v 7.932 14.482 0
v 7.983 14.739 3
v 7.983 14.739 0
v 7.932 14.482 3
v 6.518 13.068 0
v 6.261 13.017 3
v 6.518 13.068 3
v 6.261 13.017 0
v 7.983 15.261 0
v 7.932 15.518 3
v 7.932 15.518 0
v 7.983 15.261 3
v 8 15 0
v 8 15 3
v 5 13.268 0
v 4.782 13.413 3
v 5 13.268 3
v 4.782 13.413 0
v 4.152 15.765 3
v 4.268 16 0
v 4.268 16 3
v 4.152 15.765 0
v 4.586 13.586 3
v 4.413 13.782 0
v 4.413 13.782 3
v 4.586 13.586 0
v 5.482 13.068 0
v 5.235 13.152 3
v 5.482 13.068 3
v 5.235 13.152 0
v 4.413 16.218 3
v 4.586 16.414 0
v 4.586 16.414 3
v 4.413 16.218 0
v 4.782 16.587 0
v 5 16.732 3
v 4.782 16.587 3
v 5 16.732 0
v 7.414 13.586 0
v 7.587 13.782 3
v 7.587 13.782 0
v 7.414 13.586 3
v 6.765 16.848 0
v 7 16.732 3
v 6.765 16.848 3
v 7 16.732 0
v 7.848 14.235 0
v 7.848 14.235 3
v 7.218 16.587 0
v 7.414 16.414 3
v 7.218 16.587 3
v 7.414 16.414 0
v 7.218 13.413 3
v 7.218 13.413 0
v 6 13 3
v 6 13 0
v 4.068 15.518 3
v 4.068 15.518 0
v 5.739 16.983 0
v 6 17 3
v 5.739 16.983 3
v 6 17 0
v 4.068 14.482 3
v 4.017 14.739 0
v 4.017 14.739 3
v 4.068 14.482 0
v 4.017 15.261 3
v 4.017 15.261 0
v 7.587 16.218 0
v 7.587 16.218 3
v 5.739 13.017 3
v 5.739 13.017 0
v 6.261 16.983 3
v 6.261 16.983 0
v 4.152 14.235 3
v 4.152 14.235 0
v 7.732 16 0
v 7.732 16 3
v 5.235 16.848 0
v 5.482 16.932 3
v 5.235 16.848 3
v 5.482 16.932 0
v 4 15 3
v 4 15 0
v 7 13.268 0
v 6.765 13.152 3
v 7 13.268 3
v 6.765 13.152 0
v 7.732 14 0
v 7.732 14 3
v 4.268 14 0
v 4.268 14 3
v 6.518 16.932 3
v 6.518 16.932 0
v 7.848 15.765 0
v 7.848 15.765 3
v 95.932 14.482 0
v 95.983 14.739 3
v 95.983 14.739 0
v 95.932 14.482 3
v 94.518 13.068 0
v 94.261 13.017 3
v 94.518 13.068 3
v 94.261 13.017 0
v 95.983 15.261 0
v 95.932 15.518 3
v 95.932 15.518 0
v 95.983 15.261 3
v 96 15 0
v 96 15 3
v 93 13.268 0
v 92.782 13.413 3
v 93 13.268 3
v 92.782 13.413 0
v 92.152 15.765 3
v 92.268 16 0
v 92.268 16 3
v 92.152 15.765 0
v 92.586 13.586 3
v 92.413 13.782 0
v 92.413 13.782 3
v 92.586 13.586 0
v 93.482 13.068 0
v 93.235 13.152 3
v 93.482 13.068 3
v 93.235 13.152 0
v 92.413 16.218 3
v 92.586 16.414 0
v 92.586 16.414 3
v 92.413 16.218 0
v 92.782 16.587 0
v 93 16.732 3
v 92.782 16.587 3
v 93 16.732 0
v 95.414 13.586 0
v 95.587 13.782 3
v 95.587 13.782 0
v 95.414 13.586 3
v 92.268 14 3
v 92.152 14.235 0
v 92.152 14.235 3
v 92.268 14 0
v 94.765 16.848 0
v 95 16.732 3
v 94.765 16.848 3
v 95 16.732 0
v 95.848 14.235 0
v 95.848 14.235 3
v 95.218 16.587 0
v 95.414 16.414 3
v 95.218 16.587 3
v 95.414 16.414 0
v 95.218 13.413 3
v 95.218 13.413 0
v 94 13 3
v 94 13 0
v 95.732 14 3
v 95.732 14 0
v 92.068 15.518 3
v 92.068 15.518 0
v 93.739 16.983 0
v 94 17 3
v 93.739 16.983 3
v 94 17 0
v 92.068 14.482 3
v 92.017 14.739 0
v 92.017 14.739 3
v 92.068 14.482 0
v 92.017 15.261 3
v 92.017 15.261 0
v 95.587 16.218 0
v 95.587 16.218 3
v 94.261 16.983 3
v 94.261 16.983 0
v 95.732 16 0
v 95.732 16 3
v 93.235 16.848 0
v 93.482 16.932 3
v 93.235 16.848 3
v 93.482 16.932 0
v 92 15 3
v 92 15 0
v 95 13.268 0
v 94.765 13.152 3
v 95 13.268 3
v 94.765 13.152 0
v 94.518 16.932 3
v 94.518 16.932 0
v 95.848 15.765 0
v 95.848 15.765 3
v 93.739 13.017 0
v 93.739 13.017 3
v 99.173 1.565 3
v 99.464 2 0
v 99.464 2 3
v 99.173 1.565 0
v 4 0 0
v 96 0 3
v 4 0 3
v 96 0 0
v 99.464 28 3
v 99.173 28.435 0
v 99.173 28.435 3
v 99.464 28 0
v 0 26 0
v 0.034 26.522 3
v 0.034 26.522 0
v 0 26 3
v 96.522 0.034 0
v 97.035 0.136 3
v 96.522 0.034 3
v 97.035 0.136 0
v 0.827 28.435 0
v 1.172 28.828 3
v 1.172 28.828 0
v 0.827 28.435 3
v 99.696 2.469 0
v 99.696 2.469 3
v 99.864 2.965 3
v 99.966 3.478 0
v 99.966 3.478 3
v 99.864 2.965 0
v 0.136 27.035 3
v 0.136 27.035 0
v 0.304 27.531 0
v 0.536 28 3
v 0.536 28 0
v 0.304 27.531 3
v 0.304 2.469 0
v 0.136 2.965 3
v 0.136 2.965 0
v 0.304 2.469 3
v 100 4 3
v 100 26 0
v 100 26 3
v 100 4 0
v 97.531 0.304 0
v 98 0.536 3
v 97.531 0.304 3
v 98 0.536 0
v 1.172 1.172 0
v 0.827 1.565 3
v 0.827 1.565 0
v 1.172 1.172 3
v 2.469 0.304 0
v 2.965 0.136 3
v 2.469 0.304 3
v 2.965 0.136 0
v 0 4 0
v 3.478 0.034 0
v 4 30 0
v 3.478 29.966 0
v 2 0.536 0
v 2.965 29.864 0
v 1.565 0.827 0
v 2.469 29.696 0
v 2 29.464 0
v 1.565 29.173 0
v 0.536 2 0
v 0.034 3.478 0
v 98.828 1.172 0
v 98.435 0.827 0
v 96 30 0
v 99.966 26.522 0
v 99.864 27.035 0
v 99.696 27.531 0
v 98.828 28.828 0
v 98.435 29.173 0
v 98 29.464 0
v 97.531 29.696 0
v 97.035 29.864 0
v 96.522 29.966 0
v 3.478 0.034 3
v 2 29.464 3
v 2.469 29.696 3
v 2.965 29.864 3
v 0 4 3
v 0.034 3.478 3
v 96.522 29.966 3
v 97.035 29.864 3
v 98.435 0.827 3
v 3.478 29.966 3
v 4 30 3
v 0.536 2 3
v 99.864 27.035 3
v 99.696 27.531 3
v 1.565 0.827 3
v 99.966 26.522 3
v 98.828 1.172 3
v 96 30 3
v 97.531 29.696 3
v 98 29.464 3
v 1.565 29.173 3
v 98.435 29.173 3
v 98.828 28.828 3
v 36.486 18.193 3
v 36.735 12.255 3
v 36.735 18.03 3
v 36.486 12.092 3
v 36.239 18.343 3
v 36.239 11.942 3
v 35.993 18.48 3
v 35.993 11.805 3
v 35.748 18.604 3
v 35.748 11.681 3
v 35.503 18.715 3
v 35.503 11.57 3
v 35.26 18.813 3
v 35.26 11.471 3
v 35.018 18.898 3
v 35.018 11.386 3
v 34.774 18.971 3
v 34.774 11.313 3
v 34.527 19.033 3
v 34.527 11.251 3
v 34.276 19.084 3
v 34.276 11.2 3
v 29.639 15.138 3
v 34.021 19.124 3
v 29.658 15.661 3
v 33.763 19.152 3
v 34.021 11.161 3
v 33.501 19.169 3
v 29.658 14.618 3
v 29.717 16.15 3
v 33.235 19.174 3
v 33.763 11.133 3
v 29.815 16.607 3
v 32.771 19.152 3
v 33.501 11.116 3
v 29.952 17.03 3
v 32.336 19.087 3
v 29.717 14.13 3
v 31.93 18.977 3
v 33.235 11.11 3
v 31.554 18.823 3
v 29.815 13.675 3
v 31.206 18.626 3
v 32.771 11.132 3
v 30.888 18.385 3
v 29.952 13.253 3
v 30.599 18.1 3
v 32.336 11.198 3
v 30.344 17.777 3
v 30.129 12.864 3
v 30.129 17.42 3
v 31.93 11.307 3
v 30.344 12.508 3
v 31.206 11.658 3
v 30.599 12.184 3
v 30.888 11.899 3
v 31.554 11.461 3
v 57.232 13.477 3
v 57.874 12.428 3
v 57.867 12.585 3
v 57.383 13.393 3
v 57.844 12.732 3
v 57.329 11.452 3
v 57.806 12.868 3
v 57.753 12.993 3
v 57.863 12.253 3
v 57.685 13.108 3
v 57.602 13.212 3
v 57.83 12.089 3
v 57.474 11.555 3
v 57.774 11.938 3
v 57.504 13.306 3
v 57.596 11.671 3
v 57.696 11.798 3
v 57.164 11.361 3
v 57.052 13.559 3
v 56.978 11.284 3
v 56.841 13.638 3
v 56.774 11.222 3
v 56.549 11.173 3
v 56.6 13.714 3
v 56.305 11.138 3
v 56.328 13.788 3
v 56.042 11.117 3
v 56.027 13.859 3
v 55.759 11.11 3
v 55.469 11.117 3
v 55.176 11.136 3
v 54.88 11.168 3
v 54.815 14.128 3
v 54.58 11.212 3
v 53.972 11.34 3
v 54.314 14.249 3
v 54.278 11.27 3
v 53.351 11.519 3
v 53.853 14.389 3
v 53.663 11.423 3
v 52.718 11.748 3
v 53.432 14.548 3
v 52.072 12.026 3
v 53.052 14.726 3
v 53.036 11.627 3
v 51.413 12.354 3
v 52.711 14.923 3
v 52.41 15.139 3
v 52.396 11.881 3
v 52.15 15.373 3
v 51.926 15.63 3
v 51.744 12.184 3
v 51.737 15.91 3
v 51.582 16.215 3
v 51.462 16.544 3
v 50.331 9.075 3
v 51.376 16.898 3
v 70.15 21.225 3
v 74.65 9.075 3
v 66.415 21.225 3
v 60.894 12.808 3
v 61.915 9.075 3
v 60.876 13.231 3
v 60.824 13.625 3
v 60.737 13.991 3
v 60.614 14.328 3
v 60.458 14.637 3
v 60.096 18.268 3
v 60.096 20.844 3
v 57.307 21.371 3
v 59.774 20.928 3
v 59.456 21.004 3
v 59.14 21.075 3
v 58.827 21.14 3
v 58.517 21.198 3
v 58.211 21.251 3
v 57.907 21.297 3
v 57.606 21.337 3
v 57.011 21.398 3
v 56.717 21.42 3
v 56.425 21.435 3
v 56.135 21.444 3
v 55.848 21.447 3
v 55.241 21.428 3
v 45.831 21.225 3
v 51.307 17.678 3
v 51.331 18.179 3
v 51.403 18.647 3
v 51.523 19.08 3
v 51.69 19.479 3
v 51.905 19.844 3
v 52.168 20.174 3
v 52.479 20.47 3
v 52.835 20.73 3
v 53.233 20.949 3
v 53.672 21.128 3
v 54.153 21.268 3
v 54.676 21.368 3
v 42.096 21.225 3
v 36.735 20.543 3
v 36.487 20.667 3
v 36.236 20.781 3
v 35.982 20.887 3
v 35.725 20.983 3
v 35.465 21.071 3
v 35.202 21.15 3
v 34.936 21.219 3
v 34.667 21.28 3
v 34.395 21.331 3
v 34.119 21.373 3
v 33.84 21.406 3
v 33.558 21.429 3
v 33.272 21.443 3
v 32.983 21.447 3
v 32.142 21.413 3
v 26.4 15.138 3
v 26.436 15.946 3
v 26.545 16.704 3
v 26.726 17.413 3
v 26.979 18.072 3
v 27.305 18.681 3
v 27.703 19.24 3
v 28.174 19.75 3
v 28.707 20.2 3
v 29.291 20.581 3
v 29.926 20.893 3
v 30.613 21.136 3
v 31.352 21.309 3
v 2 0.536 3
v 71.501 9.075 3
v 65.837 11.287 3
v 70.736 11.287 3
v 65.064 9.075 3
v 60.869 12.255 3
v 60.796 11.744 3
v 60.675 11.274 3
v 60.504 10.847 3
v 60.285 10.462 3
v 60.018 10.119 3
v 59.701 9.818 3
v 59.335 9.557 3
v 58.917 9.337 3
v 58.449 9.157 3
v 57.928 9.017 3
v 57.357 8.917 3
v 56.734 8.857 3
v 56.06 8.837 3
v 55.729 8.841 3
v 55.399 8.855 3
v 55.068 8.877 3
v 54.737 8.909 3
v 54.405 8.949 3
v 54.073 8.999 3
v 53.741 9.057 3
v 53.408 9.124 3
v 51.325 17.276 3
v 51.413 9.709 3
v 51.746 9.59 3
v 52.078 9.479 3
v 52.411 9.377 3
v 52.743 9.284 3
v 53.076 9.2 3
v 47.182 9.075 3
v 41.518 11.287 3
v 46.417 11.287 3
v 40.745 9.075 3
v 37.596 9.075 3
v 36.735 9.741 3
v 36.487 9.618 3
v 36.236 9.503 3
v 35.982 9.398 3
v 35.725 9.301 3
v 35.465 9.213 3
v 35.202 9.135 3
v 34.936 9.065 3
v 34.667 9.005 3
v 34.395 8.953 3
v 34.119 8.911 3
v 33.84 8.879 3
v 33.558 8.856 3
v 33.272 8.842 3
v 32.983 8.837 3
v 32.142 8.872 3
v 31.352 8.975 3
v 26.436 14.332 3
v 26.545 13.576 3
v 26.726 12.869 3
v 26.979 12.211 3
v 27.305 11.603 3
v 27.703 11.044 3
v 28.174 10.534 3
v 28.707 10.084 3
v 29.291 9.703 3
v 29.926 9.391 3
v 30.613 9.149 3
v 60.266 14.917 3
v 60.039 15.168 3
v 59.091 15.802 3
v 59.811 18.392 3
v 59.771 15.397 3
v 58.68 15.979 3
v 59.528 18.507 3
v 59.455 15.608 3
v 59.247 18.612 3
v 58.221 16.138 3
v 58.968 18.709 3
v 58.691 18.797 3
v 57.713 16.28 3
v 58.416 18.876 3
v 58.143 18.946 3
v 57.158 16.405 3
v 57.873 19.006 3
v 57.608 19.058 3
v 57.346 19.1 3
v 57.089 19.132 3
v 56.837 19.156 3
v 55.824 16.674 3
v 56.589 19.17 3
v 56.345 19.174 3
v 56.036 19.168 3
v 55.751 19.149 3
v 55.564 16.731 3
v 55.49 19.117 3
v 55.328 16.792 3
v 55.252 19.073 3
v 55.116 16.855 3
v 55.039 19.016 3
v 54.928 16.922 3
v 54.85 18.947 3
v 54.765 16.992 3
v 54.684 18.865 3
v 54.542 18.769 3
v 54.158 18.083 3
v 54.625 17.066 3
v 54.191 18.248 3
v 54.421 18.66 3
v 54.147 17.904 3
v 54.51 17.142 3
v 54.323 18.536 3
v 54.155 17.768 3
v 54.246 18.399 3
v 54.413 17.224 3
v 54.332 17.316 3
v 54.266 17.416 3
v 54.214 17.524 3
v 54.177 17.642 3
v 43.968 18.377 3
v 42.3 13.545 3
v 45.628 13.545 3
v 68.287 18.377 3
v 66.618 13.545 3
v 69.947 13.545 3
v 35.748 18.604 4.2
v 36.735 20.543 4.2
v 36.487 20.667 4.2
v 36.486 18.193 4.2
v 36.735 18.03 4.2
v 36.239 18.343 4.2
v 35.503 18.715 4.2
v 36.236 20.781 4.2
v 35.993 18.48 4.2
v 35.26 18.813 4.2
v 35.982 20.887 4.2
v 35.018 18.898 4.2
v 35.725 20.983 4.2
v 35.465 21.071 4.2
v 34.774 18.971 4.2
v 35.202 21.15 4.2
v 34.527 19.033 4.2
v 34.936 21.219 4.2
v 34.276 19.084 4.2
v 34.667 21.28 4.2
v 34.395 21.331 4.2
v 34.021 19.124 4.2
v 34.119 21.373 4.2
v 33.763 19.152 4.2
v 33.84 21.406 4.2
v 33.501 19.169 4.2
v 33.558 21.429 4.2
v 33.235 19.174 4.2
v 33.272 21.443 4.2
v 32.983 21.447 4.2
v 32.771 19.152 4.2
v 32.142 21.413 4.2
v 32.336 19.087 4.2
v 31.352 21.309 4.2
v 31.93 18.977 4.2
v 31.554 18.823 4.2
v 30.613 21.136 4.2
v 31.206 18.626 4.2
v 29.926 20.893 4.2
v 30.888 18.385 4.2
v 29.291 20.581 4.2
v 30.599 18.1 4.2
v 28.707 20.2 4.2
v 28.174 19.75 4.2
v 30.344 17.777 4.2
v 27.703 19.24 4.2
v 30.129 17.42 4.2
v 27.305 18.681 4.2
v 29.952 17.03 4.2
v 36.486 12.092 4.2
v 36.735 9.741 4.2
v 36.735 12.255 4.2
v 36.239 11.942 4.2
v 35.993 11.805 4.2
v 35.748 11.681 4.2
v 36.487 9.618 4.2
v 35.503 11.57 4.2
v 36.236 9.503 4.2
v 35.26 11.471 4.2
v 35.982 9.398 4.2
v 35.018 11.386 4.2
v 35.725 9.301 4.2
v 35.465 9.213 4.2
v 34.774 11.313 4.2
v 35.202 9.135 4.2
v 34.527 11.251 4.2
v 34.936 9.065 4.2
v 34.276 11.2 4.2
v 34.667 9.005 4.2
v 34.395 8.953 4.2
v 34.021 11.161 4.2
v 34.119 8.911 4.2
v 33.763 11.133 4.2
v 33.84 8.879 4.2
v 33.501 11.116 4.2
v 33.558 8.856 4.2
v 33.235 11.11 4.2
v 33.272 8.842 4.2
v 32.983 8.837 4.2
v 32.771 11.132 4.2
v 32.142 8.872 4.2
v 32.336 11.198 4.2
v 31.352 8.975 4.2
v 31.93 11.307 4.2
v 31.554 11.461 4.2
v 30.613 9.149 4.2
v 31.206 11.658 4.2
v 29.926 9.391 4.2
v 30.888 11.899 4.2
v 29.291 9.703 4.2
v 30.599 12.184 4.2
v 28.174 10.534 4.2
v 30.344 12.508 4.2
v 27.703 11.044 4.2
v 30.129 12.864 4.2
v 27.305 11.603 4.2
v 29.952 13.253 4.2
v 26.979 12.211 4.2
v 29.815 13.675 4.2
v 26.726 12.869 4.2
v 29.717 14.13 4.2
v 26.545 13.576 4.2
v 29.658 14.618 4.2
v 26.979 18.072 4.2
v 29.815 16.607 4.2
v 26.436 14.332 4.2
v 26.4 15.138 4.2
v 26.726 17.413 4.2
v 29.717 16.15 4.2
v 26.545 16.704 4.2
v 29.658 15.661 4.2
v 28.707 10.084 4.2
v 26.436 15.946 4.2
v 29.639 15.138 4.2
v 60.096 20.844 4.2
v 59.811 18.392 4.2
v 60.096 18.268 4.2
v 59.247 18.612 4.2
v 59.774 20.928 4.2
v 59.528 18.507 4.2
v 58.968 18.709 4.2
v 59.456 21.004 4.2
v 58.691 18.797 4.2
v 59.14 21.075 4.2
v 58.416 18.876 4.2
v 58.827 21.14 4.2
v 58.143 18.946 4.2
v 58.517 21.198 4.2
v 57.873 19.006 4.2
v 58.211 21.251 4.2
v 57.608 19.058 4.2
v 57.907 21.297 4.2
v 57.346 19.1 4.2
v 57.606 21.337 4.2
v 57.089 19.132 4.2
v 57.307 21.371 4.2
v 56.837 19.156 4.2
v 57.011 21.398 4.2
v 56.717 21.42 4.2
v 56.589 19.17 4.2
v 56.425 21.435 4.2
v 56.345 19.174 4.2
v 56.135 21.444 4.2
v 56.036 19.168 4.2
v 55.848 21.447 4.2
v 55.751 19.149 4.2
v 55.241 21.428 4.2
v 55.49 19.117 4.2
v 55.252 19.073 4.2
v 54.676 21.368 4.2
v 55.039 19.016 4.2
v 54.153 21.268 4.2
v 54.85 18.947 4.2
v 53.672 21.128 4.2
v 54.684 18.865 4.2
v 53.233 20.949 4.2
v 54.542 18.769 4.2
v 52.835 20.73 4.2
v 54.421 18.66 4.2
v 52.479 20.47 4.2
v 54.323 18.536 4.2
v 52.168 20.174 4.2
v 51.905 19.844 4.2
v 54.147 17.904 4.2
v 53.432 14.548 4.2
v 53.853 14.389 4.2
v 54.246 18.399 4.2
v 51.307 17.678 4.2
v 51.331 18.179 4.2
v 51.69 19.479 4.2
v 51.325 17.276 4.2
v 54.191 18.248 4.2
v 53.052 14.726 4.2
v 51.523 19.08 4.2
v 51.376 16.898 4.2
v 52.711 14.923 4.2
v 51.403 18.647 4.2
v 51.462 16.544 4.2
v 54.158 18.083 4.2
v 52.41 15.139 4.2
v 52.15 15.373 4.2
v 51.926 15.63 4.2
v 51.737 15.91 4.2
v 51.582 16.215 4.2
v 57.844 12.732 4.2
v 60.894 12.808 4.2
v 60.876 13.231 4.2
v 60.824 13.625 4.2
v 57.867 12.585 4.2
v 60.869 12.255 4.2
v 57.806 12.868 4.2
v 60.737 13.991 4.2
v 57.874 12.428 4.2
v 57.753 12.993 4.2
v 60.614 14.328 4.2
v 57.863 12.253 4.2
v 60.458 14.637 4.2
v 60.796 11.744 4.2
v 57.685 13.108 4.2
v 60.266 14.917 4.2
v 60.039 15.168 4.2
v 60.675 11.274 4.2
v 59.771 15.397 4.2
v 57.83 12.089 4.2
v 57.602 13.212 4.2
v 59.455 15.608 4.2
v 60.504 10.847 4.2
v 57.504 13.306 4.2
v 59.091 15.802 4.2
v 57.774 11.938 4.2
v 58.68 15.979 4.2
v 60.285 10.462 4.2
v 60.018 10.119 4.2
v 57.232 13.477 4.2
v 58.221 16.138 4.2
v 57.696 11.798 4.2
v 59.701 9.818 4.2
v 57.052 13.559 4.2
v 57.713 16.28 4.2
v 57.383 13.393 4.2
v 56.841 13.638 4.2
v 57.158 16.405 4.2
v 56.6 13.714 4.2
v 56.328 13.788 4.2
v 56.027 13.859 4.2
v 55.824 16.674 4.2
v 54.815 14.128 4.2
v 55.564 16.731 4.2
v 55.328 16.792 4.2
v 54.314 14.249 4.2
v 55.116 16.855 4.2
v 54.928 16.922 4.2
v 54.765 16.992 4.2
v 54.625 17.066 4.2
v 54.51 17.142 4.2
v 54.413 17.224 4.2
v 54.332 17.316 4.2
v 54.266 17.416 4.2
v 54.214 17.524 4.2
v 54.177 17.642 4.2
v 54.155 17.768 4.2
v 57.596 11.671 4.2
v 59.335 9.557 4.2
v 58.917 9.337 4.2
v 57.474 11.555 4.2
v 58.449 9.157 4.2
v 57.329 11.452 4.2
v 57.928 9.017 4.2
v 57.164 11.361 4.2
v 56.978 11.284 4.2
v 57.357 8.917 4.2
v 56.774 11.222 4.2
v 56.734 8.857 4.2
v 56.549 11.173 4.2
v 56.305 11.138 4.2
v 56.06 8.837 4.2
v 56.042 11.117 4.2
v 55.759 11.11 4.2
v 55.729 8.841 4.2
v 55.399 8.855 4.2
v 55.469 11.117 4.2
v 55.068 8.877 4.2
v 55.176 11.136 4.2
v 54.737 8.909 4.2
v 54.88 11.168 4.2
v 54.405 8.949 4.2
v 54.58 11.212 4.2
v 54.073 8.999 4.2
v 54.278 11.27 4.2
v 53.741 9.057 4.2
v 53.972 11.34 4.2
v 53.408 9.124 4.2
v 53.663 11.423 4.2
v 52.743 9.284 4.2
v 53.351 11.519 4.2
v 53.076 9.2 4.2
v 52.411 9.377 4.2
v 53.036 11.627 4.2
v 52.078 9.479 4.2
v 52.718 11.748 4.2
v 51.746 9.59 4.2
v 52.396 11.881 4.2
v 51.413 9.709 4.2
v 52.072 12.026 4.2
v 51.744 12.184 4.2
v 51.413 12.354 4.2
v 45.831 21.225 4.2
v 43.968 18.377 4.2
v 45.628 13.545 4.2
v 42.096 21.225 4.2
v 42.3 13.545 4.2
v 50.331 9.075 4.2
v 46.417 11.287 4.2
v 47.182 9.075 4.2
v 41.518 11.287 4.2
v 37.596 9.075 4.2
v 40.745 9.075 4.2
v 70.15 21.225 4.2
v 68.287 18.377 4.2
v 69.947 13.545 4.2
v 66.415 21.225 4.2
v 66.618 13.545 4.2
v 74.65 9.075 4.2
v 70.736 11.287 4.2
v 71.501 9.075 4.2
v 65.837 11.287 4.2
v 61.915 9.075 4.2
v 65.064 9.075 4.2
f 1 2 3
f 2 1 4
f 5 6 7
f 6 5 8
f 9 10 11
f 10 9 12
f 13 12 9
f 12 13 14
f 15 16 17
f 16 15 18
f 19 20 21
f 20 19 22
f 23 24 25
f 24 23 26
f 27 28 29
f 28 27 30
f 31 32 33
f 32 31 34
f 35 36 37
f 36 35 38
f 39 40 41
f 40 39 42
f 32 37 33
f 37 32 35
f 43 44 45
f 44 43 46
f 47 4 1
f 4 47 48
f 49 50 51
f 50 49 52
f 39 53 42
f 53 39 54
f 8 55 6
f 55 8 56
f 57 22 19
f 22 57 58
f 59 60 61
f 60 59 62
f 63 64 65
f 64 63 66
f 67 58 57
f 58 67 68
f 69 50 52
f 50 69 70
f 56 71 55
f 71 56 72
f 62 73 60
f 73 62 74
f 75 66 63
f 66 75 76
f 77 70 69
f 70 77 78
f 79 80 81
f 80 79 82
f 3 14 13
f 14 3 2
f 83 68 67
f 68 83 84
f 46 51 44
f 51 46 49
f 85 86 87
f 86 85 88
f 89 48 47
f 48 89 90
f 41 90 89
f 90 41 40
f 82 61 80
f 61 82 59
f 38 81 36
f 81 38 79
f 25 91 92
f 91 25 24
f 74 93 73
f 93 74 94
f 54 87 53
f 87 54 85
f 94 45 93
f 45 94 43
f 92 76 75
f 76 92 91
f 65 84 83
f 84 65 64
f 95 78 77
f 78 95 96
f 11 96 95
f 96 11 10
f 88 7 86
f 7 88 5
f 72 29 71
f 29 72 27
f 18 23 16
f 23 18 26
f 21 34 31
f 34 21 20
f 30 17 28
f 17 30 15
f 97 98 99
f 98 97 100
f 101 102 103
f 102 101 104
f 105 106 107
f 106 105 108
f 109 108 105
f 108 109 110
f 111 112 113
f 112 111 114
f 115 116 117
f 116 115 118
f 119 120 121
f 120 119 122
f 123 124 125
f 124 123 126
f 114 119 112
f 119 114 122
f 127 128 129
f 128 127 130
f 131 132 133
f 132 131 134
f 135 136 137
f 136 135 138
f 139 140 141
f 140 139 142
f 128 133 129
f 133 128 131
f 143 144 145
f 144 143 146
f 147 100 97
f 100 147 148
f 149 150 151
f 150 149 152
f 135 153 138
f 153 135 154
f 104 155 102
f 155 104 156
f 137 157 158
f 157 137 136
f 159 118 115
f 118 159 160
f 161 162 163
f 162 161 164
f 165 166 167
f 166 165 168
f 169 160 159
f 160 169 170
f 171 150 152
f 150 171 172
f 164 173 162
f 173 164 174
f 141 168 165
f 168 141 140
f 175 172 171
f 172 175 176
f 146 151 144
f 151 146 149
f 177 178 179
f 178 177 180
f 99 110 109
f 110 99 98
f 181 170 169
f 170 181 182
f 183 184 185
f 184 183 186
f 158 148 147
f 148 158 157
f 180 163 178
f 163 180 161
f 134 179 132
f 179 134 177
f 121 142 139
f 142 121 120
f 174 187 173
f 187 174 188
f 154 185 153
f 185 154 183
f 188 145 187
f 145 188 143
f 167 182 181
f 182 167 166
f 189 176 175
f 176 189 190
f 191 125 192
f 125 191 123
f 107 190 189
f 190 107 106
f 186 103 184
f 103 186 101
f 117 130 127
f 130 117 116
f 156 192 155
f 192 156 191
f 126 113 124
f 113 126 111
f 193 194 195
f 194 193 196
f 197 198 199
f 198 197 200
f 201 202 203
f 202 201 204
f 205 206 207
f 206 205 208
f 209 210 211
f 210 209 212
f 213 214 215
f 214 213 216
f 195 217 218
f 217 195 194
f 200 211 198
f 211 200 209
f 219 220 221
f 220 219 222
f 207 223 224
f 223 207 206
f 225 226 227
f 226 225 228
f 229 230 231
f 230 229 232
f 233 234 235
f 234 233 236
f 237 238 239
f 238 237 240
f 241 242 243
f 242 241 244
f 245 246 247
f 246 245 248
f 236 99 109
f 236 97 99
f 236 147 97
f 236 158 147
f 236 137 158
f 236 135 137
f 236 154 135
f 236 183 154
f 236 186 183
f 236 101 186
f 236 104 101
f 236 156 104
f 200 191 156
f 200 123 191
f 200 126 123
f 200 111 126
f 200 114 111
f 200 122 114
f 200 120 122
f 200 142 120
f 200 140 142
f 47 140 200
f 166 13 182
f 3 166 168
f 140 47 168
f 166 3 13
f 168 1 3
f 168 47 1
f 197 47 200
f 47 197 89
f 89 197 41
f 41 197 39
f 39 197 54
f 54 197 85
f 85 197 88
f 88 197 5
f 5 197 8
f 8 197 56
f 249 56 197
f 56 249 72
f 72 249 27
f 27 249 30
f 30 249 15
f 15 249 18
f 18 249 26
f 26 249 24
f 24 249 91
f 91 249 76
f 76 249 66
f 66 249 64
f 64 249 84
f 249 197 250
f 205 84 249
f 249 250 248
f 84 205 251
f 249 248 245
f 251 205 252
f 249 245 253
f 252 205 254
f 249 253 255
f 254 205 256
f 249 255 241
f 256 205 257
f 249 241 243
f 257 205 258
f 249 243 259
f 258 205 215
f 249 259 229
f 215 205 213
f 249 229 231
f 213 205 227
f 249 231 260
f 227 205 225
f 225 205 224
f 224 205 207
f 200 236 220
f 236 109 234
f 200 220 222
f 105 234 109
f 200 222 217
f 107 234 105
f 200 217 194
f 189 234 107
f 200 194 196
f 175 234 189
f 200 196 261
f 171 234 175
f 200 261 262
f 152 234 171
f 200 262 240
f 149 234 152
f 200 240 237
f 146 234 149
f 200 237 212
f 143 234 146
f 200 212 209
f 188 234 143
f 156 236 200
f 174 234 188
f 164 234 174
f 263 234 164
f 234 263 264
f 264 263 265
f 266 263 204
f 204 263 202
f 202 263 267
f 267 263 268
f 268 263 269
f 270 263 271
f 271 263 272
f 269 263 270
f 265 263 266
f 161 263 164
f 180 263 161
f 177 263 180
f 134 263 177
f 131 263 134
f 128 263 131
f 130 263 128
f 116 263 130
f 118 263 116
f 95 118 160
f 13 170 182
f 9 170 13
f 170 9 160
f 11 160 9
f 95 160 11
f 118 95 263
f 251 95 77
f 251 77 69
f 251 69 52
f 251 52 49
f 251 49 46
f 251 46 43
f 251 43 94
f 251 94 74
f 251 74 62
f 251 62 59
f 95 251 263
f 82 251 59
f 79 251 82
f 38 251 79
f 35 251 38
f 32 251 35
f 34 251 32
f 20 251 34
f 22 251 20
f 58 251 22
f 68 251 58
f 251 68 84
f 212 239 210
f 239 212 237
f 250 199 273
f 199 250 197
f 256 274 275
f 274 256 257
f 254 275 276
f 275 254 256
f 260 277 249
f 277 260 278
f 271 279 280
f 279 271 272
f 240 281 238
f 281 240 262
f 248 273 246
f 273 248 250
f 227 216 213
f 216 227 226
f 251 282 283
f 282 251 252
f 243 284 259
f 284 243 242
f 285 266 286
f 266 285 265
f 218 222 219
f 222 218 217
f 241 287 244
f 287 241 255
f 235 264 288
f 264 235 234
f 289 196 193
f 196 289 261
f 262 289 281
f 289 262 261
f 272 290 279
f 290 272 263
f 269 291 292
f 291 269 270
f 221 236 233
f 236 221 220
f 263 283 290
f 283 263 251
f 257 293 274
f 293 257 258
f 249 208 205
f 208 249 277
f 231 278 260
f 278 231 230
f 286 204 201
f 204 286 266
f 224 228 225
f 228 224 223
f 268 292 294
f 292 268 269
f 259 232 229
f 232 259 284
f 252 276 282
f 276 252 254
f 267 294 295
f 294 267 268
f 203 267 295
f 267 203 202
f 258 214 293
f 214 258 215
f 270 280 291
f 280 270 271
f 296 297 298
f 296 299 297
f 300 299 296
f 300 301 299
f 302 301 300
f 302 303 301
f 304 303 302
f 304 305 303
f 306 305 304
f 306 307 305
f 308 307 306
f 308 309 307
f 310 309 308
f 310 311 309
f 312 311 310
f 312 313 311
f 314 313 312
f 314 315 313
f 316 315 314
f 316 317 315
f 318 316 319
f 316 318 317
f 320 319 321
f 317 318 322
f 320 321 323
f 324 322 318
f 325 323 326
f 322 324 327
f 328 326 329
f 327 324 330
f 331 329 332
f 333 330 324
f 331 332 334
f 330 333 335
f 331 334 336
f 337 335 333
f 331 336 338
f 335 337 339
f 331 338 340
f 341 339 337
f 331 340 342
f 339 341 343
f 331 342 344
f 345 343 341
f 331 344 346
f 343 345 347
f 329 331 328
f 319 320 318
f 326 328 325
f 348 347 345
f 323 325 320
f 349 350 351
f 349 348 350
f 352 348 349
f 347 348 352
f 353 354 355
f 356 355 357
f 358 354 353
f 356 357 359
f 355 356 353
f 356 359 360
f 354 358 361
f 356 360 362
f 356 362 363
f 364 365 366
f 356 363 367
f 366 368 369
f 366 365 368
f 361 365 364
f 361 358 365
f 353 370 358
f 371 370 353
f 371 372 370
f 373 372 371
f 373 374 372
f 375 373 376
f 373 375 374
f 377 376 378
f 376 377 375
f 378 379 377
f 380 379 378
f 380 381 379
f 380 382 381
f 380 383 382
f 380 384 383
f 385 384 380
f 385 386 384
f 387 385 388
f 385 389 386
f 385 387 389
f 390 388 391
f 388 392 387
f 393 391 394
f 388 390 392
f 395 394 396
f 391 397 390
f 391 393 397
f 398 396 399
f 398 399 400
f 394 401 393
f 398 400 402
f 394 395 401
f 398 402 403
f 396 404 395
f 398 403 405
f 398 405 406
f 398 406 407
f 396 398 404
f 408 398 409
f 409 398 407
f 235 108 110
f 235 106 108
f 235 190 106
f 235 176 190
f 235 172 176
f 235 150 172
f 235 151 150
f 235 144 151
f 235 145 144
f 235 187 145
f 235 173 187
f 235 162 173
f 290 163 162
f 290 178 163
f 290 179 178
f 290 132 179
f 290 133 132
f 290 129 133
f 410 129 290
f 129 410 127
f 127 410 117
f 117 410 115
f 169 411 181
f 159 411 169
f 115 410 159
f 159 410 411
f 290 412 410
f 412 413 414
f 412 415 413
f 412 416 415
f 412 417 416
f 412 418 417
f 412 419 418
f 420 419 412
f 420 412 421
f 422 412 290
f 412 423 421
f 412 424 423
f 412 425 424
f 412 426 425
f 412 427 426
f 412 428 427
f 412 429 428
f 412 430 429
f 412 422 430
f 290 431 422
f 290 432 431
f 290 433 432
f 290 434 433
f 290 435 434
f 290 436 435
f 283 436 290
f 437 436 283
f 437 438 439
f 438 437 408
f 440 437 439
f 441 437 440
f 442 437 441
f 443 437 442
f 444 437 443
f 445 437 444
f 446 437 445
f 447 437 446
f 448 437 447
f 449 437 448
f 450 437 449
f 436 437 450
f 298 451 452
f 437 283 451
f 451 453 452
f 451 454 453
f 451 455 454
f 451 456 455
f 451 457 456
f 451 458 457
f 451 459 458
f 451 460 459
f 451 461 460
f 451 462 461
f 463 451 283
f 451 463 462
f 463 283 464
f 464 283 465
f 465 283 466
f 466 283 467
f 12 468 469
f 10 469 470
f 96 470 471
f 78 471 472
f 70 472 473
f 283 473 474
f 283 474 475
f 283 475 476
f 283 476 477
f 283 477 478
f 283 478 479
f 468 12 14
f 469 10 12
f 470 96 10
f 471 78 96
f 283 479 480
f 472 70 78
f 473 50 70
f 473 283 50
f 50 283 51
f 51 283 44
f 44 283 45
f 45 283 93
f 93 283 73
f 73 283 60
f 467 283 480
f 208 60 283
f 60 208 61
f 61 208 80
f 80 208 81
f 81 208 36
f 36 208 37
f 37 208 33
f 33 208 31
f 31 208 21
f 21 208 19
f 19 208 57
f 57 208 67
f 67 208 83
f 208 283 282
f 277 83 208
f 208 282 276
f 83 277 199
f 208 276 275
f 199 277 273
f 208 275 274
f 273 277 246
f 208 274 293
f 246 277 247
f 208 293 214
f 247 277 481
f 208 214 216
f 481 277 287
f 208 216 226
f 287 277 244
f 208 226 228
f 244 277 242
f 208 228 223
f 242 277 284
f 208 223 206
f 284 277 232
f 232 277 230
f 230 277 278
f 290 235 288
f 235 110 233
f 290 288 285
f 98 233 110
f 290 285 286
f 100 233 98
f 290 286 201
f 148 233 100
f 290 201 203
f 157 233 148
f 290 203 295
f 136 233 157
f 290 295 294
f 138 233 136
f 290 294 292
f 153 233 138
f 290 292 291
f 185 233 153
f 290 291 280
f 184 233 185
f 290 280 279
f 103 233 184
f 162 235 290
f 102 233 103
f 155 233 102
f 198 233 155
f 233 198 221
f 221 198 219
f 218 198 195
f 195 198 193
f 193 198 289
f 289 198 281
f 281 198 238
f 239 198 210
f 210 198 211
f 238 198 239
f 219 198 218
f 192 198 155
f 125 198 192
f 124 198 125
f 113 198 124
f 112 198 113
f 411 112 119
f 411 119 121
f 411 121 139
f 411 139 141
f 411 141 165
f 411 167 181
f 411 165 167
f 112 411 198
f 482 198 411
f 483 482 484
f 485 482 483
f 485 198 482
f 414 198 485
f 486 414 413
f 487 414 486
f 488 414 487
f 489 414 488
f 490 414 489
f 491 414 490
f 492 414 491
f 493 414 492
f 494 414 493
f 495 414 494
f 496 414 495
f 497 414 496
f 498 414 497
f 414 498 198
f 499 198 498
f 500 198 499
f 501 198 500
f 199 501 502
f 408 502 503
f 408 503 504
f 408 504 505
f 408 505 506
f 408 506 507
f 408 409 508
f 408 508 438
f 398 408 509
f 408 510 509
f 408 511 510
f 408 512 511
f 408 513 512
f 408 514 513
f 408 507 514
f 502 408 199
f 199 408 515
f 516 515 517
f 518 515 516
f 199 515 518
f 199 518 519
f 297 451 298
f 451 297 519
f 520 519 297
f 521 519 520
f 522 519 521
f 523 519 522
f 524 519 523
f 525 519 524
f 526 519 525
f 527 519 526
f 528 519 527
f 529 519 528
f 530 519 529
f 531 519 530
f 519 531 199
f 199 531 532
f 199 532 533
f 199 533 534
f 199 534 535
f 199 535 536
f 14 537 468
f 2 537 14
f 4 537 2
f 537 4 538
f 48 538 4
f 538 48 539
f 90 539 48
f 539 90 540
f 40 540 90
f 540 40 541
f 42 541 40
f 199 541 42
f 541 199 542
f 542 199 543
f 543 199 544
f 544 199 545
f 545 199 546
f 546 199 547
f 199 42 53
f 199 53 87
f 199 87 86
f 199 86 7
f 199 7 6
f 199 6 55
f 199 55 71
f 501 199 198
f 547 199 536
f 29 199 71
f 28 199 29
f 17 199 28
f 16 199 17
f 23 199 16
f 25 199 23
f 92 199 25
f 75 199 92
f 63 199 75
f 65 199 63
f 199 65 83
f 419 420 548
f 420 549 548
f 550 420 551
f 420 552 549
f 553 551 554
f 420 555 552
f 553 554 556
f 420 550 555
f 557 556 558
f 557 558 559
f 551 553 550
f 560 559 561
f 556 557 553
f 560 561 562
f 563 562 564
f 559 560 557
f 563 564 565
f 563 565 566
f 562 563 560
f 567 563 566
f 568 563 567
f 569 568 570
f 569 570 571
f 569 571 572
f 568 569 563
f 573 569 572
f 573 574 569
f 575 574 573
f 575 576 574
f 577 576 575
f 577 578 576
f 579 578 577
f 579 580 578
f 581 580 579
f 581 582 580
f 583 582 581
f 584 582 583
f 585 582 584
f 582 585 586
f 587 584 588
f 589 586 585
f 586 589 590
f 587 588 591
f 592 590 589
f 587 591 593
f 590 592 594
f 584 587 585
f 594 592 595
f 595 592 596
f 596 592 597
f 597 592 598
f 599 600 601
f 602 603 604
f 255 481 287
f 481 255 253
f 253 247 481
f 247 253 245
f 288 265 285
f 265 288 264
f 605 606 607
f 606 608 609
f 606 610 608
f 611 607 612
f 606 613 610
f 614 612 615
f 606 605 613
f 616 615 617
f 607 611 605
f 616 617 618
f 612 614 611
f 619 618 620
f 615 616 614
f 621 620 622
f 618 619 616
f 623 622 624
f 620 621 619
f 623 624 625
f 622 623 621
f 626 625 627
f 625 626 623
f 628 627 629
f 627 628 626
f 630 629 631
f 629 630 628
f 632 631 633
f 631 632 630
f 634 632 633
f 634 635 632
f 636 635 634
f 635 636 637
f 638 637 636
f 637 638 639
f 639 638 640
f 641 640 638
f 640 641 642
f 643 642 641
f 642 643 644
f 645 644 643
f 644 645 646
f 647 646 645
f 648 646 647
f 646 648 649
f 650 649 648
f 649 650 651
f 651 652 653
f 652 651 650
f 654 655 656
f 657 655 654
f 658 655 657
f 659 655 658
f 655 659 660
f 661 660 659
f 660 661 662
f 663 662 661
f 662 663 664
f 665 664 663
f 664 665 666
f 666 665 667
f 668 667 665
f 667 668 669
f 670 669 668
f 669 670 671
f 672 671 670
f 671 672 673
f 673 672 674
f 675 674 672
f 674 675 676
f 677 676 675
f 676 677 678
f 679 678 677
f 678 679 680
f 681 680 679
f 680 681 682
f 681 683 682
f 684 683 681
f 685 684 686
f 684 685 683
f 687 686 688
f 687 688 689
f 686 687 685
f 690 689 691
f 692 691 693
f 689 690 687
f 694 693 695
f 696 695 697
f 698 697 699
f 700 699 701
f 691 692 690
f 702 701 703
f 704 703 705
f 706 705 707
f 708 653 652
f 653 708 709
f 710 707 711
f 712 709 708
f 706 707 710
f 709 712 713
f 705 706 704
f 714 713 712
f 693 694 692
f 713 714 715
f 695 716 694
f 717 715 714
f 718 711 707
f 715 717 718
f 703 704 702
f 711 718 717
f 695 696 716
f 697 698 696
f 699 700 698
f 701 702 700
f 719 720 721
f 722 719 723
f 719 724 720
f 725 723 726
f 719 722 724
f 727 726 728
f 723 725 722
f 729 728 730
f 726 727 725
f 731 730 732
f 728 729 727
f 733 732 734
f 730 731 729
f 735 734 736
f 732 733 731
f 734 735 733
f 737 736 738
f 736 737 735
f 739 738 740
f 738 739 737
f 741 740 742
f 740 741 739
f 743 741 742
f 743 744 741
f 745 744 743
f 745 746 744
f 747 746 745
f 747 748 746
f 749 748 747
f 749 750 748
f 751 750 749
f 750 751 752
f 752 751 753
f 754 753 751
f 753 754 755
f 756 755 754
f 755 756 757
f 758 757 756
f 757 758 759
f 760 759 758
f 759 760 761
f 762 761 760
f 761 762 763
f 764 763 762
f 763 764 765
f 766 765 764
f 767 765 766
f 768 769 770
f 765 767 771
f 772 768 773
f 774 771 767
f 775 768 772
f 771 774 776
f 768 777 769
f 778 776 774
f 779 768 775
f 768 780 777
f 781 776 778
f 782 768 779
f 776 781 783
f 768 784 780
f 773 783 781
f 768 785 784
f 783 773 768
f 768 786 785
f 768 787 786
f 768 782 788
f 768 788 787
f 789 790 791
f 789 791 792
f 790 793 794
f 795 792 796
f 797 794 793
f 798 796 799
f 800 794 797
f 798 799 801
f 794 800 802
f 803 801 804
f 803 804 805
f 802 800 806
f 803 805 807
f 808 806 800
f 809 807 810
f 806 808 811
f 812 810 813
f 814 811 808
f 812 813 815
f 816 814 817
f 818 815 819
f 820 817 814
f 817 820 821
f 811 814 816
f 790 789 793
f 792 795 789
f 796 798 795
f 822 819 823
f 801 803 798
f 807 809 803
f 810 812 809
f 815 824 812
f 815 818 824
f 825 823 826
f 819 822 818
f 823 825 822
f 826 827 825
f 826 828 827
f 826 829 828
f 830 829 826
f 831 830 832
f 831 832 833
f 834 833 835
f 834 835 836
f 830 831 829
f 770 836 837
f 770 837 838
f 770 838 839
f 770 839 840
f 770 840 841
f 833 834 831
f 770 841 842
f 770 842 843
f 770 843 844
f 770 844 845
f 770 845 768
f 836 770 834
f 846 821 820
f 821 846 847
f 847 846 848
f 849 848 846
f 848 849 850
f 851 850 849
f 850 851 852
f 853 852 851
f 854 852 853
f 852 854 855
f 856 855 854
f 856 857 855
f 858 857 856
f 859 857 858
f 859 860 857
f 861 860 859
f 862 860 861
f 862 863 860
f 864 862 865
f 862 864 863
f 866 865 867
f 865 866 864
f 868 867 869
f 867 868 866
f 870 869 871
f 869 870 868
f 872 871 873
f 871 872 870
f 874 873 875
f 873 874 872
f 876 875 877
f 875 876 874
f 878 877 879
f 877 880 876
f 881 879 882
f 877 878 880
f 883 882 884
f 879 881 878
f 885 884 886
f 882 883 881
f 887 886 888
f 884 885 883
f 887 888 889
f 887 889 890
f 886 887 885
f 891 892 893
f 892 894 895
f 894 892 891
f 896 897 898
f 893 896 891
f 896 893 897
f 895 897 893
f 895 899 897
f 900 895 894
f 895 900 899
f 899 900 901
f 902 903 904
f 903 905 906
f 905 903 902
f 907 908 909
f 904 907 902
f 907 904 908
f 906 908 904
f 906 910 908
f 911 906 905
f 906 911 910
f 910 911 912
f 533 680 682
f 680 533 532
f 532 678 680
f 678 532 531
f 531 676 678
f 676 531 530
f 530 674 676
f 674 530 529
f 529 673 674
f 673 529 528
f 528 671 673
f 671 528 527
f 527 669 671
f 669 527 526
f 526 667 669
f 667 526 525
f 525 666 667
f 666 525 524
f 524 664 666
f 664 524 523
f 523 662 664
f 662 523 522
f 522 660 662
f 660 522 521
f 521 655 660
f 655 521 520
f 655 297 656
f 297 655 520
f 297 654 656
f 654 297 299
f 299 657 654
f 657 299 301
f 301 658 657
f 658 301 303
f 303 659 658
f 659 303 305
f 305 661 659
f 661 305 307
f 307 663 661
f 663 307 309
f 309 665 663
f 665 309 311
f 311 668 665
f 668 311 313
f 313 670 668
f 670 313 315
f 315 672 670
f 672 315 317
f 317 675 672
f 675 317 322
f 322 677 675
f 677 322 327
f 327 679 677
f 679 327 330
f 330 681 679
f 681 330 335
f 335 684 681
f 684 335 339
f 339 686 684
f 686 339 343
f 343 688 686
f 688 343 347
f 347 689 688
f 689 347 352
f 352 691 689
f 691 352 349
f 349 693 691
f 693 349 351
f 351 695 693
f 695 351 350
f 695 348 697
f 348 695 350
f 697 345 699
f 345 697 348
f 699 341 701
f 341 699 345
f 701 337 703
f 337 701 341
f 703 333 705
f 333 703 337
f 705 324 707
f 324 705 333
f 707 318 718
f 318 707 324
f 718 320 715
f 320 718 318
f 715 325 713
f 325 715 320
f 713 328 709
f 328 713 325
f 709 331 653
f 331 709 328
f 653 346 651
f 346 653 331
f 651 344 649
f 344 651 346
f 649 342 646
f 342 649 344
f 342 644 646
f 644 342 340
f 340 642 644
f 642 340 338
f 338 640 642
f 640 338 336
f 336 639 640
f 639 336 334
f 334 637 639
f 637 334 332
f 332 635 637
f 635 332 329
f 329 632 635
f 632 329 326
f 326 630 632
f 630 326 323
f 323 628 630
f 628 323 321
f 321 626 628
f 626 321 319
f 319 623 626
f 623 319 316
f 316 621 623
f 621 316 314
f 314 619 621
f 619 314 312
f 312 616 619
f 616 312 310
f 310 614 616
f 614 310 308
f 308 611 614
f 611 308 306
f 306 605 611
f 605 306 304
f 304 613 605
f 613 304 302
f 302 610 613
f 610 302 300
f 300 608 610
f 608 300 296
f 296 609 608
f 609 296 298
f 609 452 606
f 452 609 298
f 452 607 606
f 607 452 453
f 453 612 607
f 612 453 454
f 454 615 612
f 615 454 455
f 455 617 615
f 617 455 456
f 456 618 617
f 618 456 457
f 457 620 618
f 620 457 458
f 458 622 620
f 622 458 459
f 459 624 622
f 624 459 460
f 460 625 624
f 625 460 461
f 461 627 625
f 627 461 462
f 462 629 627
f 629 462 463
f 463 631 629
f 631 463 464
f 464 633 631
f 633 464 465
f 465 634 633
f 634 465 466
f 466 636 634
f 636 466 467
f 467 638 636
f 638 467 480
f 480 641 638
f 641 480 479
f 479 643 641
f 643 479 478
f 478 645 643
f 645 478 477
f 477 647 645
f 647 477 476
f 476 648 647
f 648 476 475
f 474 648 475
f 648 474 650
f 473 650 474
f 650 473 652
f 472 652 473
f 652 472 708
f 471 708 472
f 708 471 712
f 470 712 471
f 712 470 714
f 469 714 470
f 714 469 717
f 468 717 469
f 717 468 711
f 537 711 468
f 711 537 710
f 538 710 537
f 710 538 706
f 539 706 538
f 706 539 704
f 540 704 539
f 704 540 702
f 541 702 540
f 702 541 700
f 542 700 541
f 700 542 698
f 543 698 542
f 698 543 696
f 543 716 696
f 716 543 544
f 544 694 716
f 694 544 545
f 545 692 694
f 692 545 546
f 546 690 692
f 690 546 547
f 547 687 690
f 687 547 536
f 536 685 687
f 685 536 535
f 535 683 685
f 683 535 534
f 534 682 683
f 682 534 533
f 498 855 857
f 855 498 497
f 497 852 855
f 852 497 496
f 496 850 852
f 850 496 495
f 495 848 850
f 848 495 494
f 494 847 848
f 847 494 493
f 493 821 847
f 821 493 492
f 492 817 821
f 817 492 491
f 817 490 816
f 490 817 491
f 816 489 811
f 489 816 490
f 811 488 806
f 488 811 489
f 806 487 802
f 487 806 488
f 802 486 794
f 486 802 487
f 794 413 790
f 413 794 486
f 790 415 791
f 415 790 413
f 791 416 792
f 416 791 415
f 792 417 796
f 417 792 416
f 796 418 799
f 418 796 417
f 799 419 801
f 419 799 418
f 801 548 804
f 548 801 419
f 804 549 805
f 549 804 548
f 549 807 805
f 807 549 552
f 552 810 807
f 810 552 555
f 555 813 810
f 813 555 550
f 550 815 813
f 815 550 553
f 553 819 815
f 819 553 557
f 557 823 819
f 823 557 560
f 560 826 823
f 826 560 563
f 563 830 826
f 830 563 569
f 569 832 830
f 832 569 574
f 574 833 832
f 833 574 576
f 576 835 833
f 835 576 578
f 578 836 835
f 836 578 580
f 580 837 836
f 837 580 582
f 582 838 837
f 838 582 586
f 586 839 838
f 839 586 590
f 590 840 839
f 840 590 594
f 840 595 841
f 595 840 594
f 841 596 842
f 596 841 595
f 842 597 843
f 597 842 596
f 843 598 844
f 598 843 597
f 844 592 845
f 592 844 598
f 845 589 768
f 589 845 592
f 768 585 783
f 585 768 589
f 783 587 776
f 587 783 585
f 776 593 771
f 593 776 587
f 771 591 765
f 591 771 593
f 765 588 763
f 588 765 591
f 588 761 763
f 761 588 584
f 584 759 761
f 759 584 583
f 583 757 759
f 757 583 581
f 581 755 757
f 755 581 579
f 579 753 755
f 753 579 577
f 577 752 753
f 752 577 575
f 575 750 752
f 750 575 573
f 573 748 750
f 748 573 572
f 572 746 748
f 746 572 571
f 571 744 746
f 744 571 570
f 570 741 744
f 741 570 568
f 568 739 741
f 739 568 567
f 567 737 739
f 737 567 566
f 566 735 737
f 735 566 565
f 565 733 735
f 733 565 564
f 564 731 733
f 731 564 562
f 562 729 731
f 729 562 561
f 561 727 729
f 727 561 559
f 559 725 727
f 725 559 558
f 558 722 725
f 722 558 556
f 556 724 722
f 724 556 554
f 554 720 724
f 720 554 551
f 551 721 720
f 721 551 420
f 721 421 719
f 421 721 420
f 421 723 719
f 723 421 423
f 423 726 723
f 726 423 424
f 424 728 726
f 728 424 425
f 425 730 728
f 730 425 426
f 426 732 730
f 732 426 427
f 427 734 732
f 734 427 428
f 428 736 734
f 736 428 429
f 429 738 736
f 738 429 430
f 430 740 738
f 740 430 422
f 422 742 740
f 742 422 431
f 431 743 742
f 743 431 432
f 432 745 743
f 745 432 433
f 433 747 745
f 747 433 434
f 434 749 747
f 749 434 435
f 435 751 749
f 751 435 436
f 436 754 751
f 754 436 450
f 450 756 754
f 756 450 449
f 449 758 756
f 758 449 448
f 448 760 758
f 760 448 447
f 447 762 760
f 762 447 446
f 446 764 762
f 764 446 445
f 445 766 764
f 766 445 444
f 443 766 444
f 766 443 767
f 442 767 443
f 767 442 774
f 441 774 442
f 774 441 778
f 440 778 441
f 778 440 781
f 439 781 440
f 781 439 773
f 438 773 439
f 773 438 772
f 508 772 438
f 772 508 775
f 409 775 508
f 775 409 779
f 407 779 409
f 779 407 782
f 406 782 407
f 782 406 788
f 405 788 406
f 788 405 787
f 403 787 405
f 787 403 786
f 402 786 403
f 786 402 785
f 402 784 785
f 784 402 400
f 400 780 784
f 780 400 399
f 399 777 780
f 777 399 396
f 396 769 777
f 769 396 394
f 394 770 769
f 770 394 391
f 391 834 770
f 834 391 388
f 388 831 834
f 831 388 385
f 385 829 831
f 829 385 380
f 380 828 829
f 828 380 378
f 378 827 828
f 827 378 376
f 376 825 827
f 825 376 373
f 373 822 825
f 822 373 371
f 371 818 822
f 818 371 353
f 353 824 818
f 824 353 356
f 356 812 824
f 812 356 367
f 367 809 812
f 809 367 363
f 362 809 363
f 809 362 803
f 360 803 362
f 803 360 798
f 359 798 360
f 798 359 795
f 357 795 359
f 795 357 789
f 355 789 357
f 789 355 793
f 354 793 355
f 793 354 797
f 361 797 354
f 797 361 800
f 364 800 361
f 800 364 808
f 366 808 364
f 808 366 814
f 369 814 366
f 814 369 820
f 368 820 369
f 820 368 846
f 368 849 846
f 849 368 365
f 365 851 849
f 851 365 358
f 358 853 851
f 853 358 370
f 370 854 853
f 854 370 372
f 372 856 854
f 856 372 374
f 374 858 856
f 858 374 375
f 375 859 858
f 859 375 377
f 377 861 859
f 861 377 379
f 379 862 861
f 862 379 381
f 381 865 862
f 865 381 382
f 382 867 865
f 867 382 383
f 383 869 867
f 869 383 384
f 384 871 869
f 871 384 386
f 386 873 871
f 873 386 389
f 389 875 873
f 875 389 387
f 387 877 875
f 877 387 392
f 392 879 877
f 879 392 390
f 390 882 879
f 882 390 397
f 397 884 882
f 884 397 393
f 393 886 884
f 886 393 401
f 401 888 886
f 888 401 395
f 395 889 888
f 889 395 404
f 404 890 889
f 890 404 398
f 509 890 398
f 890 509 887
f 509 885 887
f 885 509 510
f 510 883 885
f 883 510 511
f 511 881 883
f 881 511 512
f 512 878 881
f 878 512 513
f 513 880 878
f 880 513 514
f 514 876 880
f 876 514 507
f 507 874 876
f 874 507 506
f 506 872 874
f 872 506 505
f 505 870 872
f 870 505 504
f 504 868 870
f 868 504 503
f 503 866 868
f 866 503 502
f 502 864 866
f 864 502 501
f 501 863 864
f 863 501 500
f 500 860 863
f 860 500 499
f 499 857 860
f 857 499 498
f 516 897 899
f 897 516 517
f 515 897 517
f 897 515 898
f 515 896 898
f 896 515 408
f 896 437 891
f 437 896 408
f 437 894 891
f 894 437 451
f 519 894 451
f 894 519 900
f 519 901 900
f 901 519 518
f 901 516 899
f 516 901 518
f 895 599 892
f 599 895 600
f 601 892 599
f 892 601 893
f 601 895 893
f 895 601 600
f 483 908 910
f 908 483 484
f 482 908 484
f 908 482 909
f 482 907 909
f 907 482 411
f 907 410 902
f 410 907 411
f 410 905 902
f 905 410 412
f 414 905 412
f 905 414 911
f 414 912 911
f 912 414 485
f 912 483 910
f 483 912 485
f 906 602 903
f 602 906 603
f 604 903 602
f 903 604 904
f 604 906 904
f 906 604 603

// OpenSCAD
// Targhetta con nome: piastra con angoli arrotondati, testo in rilievo e fori facoltativi.
// I parametri arrivano dal server (Services/CatalogoStampa3d.cs) con -D nome=valore.
testo = "CASA";
larghezza = 100;
altezza = 30;
spessore = 3;
dimensione_testo = 12;
rilievo = 1.2;
fori = true;
raggio = 4;

FONT = "DejaVu Sans:style=Bold";
$fn = 48;
r = min(raggio, altezza / 2 - 0.1, larghezza / 2 - 0.1);

module piastra() {
    hull()
        for (x = [r, larghezza - r], y = [r, altezza - r])
            translate([x, y, 0]) cylinder(r = r, h = spessore);
}

difference() {
    piastra();
    if (fori)
        for (x = [6, larghezza - 6])
            translate([x, altezza / 2, -1]) cylinder(d = 4, h = spessore + 2);
}

if (len(testo) > 0)
    translate([larghezza / 2, altezza / 2, spessore - 0.01])
        linear_extrude(rilievo + 0.01)
            text(testo, size = dimensione_testo, font = FONT, halign = "center", valign = "center");
